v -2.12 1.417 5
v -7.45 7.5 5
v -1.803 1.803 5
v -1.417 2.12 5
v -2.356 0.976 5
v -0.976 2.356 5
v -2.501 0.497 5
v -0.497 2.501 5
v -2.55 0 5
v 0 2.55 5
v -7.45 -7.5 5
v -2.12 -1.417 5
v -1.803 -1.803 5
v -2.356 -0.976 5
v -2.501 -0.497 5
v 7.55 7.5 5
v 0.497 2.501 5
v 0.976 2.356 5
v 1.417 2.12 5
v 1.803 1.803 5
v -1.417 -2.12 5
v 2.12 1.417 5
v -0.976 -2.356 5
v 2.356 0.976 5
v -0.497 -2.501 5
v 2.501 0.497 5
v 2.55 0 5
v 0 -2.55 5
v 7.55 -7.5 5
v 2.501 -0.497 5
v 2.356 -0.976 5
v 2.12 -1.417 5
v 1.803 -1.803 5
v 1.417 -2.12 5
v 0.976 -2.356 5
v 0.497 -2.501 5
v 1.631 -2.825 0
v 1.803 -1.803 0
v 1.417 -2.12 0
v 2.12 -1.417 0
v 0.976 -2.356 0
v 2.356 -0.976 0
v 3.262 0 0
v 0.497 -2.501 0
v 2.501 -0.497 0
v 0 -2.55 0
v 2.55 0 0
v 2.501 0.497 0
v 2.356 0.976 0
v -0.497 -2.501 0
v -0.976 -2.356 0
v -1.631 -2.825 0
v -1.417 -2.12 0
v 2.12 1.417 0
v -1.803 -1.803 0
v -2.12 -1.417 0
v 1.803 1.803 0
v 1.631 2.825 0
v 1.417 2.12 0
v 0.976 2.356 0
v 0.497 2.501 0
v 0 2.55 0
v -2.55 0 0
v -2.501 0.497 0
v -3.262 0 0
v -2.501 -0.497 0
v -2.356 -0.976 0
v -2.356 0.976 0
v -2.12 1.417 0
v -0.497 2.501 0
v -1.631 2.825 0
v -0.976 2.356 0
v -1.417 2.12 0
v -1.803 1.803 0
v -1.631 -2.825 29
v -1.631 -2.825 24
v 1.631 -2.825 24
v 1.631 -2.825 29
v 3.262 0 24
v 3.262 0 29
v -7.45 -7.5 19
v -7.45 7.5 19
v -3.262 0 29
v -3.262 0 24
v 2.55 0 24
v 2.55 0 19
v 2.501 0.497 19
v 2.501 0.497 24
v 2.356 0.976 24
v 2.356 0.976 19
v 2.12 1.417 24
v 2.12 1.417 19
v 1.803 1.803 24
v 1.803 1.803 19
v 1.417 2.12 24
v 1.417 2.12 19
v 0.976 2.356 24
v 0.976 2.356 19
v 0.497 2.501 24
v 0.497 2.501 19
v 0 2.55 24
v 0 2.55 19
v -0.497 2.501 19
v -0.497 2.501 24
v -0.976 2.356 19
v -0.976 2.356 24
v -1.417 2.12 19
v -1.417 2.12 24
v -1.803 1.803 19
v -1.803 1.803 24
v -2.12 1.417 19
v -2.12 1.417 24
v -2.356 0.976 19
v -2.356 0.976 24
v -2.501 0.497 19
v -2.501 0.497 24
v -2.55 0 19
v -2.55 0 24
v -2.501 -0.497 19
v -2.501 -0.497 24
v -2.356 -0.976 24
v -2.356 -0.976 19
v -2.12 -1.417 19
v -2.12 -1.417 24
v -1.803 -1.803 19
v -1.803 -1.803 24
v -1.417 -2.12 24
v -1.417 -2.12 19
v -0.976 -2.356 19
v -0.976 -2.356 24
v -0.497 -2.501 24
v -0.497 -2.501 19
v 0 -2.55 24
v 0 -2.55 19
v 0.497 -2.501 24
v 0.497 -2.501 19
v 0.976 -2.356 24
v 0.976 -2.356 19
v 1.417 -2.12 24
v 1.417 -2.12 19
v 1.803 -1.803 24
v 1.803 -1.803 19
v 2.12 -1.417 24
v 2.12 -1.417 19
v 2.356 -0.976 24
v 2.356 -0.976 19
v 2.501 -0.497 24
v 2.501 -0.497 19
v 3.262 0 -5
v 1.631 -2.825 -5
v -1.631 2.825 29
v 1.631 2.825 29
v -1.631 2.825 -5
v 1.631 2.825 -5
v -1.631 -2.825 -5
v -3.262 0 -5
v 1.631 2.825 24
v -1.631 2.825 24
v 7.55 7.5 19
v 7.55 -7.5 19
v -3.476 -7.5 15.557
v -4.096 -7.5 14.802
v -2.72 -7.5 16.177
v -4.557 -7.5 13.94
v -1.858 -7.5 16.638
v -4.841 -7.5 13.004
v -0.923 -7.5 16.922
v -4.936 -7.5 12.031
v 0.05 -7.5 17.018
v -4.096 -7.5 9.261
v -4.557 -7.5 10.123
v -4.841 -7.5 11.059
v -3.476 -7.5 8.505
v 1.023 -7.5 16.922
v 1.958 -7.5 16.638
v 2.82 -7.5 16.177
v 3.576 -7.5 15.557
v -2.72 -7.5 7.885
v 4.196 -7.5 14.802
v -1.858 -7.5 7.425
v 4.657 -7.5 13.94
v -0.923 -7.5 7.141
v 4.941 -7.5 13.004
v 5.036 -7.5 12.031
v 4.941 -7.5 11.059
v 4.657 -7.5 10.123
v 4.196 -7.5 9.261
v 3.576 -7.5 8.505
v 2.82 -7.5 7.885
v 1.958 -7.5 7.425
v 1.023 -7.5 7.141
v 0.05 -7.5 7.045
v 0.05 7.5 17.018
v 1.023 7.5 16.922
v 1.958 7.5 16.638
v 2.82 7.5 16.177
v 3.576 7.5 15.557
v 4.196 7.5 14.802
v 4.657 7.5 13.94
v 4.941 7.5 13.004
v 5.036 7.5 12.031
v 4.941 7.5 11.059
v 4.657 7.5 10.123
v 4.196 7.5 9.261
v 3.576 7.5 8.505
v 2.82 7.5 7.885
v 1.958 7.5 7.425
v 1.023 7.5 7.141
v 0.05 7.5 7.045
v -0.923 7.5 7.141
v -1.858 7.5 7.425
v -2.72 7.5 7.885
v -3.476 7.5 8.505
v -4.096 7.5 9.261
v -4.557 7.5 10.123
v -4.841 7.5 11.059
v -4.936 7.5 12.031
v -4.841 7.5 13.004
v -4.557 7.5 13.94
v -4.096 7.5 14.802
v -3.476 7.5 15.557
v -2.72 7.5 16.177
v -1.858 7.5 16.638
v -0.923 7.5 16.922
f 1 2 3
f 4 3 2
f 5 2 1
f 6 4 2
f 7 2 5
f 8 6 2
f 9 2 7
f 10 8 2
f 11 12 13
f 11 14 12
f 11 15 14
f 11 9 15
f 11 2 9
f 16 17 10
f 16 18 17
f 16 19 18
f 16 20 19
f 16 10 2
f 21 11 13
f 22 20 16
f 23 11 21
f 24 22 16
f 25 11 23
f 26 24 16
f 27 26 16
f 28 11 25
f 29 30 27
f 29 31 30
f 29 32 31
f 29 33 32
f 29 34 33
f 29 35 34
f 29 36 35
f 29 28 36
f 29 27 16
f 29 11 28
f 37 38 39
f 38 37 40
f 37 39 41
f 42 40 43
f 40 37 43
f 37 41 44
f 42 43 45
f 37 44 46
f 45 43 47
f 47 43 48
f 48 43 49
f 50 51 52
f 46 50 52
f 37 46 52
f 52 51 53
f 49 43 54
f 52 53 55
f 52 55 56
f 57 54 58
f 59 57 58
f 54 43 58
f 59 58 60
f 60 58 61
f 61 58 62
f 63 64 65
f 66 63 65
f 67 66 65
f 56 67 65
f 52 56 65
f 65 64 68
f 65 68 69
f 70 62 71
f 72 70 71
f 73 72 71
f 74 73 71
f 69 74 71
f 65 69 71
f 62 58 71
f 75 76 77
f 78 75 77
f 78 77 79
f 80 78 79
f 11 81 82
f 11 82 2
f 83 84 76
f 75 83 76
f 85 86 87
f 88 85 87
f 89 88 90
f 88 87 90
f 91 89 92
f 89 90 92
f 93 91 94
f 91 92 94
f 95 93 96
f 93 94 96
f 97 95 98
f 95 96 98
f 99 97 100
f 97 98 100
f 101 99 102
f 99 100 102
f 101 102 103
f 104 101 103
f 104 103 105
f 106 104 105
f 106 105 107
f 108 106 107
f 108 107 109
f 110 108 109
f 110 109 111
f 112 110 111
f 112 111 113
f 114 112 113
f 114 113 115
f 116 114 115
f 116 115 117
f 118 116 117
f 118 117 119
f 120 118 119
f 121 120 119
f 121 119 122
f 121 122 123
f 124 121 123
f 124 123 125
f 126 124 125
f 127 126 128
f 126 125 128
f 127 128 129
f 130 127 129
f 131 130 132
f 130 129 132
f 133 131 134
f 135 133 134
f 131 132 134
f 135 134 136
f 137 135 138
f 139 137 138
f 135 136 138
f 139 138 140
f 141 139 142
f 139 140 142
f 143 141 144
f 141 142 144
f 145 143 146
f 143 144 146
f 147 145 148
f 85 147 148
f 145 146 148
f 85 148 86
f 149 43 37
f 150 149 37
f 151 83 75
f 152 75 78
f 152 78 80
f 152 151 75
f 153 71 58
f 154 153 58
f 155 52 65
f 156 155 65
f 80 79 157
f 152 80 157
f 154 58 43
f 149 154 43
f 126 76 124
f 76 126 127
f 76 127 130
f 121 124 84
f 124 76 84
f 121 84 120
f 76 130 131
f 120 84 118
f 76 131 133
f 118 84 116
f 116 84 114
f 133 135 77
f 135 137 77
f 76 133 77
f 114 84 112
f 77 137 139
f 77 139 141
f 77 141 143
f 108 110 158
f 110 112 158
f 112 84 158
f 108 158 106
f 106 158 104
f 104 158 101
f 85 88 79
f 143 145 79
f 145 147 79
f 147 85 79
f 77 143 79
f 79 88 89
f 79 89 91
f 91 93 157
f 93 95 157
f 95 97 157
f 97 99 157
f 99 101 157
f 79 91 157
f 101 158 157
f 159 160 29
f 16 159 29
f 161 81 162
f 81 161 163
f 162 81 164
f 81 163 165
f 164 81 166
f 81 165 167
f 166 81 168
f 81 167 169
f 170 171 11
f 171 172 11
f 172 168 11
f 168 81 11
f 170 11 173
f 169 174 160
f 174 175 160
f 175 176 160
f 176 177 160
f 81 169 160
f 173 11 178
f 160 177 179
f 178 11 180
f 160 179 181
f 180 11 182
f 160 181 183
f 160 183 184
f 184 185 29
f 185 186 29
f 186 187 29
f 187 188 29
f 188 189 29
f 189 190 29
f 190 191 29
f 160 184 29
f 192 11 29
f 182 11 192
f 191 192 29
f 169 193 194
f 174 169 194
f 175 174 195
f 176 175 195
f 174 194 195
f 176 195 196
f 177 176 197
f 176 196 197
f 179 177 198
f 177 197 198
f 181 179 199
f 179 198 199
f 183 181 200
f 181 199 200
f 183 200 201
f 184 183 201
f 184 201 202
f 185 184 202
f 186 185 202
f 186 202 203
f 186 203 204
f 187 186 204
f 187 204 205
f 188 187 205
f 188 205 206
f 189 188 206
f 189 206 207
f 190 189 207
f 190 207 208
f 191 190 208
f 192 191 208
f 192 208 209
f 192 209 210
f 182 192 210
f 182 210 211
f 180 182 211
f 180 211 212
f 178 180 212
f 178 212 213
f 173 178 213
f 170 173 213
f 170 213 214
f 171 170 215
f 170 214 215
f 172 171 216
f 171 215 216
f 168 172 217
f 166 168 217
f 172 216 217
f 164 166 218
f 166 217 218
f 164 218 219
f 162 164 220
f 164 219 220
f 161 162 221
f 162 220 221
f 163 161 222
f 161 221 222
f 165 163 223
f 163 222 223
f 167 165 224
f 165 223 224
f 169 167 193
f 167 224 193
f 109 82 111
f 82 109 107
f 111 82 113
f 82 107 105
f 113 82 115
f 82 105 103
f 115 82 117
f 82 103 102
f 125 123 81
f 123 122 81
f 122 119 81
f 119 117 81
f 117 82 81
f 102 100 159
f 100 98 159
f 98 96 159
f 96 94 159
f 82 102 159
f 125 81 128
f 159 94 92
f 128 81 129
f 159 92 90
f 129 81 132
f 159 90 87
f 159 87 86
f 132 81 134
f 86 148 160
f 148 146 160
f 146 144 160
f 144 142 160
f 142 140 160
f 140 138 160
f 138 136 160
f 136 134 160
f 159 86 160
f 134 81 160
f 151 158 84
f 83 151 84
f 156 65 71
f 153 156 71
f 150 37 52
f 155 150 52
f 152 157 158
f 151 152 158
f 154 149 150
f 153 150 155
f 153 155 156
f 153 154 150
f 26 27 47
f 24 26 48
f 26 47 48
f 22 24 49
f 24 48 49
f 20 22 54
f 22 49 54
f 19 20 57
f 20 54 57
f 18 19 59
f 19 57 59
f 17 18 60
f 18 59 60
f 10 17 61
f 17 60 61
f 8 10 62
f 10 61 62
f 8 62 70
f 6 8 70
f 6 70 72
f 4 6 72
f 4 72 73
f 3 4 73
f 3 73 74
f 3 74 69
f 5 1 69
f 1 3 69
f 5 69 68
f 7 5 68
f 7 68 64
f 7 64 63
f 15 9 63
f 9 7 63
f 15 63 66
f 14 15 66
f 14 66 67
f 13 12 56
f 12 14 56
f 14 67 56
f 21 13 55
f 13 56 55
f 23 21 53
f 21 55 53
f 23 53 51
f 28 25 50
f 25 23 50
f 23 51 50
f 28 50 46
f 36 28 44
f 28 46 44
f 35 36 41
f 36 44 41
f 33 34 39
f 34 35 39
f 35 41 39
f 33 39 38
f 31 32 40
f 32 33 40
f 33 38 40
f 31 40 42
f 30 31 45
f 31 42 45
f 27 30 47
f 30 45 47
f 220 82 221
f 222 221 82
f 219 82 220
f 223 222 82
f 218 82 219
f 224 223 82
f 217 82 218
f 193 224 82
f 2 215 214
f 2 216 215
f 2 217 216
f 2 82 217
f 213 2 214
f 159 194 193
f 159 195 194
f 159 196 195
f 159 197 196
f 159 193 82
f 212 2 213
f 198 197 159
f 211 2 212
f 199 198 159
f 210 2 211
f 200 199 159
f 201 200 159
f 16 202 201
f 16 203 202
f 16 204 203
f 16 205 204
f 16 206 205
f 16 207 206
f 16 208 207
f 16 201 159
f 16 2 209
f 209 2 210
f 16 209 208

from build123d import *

# Parameters (mm, degrees)
SKETCH1_R                = 2.55
BOSS_EXTRUDE1_DEPTH      = 24
BOSS_EXTRUDE2_DEPTH      = 5
BOSS_EXTRUDE3_DEPTH      = 5
BOSS_EXTRUDE5_DEPTH      = 7.5
BOSS_EXTRUDE5_DEPTH_BACK = 7.5
SKETCH4_W                = 15
SKETCH4_H                = 14
SKETCH9_R                = 4.986373578
CUT_EXTRUDE2_DEPTH       = 16.5


with BuildPart() as part:
    # Sketch1 → Boss-Extrude1 (new body)
    with BuildSketch(Plane.XY):
        Circle(SKETCH1_R)
    extrude(amount=BOSS_EXTRUDE1_DEPTH)

    # Sketch2 → Boss-Extrude2 (add)
    with BuildSketch(Plane.XY.offset(24)):
        Polygon((3.262188456, 0), (1.631094228, 2.825138074), (-1.631094228, 2.825138074), (-3.262188456, 0), (-1.631094228, -2.825138074), (1.631094228, -2.825138074), align=None)
    extrude(amount=BOSS_EXTRUDE2_DEPTH)

    # Sketch3 → Boss-Extrude3 (add)
    with BuildSketch(Plane(origin=(0, 0, 0), x_dir=(-1, 0, 0), z_dir=(0, 0, -1))):
        Polygon((3.262188456, 0), (1.631094228, 2.825138074), (-1.631094228, 2.825138074), (-3.262188456, 0), (-1.631094228, -2.825138074), (1.631094228, -2.825138074), align=None)
    extrude(amount=BOSS_EXTRUDE3_DEPTH)

    # Sketch4 → Boss-Extrude5 (add, two sides: drawn at the far end of the back side and taken through both)
    with BuildSketch(Plane(origin=(0, 0, 0), x_dir=(1, 0, 0), z_dir=(0, 1, 0)).offset(-BOSS_EXTRUDE5_DEPTH_BACK)):
        with Locations((0.05, -12)):
            Rectangle(SKETCH4_W, SKETCH4_H)
    extrude(amount=BOSS_EXTRUDE5_DEPTH + BOSS_EXTRUDE5_DEPTH_BACK)

    # Sketch9 → Cut-Extrude2 (cut)
    with BuildSketch(Plane(origin=(0, 7.5, 0), x_dir=(1, 0, 0), z_dir=(0, 1, 0))):
        with Locations(Location((0.05, -12.031387259, 0), (0, 0, 270))):
            Circle(SKETCH9_R)
    extrude(amount=-CUT_EXTRUDE2_DEPTH, mode=Mode.SUBTRACT)


solid = part.part
